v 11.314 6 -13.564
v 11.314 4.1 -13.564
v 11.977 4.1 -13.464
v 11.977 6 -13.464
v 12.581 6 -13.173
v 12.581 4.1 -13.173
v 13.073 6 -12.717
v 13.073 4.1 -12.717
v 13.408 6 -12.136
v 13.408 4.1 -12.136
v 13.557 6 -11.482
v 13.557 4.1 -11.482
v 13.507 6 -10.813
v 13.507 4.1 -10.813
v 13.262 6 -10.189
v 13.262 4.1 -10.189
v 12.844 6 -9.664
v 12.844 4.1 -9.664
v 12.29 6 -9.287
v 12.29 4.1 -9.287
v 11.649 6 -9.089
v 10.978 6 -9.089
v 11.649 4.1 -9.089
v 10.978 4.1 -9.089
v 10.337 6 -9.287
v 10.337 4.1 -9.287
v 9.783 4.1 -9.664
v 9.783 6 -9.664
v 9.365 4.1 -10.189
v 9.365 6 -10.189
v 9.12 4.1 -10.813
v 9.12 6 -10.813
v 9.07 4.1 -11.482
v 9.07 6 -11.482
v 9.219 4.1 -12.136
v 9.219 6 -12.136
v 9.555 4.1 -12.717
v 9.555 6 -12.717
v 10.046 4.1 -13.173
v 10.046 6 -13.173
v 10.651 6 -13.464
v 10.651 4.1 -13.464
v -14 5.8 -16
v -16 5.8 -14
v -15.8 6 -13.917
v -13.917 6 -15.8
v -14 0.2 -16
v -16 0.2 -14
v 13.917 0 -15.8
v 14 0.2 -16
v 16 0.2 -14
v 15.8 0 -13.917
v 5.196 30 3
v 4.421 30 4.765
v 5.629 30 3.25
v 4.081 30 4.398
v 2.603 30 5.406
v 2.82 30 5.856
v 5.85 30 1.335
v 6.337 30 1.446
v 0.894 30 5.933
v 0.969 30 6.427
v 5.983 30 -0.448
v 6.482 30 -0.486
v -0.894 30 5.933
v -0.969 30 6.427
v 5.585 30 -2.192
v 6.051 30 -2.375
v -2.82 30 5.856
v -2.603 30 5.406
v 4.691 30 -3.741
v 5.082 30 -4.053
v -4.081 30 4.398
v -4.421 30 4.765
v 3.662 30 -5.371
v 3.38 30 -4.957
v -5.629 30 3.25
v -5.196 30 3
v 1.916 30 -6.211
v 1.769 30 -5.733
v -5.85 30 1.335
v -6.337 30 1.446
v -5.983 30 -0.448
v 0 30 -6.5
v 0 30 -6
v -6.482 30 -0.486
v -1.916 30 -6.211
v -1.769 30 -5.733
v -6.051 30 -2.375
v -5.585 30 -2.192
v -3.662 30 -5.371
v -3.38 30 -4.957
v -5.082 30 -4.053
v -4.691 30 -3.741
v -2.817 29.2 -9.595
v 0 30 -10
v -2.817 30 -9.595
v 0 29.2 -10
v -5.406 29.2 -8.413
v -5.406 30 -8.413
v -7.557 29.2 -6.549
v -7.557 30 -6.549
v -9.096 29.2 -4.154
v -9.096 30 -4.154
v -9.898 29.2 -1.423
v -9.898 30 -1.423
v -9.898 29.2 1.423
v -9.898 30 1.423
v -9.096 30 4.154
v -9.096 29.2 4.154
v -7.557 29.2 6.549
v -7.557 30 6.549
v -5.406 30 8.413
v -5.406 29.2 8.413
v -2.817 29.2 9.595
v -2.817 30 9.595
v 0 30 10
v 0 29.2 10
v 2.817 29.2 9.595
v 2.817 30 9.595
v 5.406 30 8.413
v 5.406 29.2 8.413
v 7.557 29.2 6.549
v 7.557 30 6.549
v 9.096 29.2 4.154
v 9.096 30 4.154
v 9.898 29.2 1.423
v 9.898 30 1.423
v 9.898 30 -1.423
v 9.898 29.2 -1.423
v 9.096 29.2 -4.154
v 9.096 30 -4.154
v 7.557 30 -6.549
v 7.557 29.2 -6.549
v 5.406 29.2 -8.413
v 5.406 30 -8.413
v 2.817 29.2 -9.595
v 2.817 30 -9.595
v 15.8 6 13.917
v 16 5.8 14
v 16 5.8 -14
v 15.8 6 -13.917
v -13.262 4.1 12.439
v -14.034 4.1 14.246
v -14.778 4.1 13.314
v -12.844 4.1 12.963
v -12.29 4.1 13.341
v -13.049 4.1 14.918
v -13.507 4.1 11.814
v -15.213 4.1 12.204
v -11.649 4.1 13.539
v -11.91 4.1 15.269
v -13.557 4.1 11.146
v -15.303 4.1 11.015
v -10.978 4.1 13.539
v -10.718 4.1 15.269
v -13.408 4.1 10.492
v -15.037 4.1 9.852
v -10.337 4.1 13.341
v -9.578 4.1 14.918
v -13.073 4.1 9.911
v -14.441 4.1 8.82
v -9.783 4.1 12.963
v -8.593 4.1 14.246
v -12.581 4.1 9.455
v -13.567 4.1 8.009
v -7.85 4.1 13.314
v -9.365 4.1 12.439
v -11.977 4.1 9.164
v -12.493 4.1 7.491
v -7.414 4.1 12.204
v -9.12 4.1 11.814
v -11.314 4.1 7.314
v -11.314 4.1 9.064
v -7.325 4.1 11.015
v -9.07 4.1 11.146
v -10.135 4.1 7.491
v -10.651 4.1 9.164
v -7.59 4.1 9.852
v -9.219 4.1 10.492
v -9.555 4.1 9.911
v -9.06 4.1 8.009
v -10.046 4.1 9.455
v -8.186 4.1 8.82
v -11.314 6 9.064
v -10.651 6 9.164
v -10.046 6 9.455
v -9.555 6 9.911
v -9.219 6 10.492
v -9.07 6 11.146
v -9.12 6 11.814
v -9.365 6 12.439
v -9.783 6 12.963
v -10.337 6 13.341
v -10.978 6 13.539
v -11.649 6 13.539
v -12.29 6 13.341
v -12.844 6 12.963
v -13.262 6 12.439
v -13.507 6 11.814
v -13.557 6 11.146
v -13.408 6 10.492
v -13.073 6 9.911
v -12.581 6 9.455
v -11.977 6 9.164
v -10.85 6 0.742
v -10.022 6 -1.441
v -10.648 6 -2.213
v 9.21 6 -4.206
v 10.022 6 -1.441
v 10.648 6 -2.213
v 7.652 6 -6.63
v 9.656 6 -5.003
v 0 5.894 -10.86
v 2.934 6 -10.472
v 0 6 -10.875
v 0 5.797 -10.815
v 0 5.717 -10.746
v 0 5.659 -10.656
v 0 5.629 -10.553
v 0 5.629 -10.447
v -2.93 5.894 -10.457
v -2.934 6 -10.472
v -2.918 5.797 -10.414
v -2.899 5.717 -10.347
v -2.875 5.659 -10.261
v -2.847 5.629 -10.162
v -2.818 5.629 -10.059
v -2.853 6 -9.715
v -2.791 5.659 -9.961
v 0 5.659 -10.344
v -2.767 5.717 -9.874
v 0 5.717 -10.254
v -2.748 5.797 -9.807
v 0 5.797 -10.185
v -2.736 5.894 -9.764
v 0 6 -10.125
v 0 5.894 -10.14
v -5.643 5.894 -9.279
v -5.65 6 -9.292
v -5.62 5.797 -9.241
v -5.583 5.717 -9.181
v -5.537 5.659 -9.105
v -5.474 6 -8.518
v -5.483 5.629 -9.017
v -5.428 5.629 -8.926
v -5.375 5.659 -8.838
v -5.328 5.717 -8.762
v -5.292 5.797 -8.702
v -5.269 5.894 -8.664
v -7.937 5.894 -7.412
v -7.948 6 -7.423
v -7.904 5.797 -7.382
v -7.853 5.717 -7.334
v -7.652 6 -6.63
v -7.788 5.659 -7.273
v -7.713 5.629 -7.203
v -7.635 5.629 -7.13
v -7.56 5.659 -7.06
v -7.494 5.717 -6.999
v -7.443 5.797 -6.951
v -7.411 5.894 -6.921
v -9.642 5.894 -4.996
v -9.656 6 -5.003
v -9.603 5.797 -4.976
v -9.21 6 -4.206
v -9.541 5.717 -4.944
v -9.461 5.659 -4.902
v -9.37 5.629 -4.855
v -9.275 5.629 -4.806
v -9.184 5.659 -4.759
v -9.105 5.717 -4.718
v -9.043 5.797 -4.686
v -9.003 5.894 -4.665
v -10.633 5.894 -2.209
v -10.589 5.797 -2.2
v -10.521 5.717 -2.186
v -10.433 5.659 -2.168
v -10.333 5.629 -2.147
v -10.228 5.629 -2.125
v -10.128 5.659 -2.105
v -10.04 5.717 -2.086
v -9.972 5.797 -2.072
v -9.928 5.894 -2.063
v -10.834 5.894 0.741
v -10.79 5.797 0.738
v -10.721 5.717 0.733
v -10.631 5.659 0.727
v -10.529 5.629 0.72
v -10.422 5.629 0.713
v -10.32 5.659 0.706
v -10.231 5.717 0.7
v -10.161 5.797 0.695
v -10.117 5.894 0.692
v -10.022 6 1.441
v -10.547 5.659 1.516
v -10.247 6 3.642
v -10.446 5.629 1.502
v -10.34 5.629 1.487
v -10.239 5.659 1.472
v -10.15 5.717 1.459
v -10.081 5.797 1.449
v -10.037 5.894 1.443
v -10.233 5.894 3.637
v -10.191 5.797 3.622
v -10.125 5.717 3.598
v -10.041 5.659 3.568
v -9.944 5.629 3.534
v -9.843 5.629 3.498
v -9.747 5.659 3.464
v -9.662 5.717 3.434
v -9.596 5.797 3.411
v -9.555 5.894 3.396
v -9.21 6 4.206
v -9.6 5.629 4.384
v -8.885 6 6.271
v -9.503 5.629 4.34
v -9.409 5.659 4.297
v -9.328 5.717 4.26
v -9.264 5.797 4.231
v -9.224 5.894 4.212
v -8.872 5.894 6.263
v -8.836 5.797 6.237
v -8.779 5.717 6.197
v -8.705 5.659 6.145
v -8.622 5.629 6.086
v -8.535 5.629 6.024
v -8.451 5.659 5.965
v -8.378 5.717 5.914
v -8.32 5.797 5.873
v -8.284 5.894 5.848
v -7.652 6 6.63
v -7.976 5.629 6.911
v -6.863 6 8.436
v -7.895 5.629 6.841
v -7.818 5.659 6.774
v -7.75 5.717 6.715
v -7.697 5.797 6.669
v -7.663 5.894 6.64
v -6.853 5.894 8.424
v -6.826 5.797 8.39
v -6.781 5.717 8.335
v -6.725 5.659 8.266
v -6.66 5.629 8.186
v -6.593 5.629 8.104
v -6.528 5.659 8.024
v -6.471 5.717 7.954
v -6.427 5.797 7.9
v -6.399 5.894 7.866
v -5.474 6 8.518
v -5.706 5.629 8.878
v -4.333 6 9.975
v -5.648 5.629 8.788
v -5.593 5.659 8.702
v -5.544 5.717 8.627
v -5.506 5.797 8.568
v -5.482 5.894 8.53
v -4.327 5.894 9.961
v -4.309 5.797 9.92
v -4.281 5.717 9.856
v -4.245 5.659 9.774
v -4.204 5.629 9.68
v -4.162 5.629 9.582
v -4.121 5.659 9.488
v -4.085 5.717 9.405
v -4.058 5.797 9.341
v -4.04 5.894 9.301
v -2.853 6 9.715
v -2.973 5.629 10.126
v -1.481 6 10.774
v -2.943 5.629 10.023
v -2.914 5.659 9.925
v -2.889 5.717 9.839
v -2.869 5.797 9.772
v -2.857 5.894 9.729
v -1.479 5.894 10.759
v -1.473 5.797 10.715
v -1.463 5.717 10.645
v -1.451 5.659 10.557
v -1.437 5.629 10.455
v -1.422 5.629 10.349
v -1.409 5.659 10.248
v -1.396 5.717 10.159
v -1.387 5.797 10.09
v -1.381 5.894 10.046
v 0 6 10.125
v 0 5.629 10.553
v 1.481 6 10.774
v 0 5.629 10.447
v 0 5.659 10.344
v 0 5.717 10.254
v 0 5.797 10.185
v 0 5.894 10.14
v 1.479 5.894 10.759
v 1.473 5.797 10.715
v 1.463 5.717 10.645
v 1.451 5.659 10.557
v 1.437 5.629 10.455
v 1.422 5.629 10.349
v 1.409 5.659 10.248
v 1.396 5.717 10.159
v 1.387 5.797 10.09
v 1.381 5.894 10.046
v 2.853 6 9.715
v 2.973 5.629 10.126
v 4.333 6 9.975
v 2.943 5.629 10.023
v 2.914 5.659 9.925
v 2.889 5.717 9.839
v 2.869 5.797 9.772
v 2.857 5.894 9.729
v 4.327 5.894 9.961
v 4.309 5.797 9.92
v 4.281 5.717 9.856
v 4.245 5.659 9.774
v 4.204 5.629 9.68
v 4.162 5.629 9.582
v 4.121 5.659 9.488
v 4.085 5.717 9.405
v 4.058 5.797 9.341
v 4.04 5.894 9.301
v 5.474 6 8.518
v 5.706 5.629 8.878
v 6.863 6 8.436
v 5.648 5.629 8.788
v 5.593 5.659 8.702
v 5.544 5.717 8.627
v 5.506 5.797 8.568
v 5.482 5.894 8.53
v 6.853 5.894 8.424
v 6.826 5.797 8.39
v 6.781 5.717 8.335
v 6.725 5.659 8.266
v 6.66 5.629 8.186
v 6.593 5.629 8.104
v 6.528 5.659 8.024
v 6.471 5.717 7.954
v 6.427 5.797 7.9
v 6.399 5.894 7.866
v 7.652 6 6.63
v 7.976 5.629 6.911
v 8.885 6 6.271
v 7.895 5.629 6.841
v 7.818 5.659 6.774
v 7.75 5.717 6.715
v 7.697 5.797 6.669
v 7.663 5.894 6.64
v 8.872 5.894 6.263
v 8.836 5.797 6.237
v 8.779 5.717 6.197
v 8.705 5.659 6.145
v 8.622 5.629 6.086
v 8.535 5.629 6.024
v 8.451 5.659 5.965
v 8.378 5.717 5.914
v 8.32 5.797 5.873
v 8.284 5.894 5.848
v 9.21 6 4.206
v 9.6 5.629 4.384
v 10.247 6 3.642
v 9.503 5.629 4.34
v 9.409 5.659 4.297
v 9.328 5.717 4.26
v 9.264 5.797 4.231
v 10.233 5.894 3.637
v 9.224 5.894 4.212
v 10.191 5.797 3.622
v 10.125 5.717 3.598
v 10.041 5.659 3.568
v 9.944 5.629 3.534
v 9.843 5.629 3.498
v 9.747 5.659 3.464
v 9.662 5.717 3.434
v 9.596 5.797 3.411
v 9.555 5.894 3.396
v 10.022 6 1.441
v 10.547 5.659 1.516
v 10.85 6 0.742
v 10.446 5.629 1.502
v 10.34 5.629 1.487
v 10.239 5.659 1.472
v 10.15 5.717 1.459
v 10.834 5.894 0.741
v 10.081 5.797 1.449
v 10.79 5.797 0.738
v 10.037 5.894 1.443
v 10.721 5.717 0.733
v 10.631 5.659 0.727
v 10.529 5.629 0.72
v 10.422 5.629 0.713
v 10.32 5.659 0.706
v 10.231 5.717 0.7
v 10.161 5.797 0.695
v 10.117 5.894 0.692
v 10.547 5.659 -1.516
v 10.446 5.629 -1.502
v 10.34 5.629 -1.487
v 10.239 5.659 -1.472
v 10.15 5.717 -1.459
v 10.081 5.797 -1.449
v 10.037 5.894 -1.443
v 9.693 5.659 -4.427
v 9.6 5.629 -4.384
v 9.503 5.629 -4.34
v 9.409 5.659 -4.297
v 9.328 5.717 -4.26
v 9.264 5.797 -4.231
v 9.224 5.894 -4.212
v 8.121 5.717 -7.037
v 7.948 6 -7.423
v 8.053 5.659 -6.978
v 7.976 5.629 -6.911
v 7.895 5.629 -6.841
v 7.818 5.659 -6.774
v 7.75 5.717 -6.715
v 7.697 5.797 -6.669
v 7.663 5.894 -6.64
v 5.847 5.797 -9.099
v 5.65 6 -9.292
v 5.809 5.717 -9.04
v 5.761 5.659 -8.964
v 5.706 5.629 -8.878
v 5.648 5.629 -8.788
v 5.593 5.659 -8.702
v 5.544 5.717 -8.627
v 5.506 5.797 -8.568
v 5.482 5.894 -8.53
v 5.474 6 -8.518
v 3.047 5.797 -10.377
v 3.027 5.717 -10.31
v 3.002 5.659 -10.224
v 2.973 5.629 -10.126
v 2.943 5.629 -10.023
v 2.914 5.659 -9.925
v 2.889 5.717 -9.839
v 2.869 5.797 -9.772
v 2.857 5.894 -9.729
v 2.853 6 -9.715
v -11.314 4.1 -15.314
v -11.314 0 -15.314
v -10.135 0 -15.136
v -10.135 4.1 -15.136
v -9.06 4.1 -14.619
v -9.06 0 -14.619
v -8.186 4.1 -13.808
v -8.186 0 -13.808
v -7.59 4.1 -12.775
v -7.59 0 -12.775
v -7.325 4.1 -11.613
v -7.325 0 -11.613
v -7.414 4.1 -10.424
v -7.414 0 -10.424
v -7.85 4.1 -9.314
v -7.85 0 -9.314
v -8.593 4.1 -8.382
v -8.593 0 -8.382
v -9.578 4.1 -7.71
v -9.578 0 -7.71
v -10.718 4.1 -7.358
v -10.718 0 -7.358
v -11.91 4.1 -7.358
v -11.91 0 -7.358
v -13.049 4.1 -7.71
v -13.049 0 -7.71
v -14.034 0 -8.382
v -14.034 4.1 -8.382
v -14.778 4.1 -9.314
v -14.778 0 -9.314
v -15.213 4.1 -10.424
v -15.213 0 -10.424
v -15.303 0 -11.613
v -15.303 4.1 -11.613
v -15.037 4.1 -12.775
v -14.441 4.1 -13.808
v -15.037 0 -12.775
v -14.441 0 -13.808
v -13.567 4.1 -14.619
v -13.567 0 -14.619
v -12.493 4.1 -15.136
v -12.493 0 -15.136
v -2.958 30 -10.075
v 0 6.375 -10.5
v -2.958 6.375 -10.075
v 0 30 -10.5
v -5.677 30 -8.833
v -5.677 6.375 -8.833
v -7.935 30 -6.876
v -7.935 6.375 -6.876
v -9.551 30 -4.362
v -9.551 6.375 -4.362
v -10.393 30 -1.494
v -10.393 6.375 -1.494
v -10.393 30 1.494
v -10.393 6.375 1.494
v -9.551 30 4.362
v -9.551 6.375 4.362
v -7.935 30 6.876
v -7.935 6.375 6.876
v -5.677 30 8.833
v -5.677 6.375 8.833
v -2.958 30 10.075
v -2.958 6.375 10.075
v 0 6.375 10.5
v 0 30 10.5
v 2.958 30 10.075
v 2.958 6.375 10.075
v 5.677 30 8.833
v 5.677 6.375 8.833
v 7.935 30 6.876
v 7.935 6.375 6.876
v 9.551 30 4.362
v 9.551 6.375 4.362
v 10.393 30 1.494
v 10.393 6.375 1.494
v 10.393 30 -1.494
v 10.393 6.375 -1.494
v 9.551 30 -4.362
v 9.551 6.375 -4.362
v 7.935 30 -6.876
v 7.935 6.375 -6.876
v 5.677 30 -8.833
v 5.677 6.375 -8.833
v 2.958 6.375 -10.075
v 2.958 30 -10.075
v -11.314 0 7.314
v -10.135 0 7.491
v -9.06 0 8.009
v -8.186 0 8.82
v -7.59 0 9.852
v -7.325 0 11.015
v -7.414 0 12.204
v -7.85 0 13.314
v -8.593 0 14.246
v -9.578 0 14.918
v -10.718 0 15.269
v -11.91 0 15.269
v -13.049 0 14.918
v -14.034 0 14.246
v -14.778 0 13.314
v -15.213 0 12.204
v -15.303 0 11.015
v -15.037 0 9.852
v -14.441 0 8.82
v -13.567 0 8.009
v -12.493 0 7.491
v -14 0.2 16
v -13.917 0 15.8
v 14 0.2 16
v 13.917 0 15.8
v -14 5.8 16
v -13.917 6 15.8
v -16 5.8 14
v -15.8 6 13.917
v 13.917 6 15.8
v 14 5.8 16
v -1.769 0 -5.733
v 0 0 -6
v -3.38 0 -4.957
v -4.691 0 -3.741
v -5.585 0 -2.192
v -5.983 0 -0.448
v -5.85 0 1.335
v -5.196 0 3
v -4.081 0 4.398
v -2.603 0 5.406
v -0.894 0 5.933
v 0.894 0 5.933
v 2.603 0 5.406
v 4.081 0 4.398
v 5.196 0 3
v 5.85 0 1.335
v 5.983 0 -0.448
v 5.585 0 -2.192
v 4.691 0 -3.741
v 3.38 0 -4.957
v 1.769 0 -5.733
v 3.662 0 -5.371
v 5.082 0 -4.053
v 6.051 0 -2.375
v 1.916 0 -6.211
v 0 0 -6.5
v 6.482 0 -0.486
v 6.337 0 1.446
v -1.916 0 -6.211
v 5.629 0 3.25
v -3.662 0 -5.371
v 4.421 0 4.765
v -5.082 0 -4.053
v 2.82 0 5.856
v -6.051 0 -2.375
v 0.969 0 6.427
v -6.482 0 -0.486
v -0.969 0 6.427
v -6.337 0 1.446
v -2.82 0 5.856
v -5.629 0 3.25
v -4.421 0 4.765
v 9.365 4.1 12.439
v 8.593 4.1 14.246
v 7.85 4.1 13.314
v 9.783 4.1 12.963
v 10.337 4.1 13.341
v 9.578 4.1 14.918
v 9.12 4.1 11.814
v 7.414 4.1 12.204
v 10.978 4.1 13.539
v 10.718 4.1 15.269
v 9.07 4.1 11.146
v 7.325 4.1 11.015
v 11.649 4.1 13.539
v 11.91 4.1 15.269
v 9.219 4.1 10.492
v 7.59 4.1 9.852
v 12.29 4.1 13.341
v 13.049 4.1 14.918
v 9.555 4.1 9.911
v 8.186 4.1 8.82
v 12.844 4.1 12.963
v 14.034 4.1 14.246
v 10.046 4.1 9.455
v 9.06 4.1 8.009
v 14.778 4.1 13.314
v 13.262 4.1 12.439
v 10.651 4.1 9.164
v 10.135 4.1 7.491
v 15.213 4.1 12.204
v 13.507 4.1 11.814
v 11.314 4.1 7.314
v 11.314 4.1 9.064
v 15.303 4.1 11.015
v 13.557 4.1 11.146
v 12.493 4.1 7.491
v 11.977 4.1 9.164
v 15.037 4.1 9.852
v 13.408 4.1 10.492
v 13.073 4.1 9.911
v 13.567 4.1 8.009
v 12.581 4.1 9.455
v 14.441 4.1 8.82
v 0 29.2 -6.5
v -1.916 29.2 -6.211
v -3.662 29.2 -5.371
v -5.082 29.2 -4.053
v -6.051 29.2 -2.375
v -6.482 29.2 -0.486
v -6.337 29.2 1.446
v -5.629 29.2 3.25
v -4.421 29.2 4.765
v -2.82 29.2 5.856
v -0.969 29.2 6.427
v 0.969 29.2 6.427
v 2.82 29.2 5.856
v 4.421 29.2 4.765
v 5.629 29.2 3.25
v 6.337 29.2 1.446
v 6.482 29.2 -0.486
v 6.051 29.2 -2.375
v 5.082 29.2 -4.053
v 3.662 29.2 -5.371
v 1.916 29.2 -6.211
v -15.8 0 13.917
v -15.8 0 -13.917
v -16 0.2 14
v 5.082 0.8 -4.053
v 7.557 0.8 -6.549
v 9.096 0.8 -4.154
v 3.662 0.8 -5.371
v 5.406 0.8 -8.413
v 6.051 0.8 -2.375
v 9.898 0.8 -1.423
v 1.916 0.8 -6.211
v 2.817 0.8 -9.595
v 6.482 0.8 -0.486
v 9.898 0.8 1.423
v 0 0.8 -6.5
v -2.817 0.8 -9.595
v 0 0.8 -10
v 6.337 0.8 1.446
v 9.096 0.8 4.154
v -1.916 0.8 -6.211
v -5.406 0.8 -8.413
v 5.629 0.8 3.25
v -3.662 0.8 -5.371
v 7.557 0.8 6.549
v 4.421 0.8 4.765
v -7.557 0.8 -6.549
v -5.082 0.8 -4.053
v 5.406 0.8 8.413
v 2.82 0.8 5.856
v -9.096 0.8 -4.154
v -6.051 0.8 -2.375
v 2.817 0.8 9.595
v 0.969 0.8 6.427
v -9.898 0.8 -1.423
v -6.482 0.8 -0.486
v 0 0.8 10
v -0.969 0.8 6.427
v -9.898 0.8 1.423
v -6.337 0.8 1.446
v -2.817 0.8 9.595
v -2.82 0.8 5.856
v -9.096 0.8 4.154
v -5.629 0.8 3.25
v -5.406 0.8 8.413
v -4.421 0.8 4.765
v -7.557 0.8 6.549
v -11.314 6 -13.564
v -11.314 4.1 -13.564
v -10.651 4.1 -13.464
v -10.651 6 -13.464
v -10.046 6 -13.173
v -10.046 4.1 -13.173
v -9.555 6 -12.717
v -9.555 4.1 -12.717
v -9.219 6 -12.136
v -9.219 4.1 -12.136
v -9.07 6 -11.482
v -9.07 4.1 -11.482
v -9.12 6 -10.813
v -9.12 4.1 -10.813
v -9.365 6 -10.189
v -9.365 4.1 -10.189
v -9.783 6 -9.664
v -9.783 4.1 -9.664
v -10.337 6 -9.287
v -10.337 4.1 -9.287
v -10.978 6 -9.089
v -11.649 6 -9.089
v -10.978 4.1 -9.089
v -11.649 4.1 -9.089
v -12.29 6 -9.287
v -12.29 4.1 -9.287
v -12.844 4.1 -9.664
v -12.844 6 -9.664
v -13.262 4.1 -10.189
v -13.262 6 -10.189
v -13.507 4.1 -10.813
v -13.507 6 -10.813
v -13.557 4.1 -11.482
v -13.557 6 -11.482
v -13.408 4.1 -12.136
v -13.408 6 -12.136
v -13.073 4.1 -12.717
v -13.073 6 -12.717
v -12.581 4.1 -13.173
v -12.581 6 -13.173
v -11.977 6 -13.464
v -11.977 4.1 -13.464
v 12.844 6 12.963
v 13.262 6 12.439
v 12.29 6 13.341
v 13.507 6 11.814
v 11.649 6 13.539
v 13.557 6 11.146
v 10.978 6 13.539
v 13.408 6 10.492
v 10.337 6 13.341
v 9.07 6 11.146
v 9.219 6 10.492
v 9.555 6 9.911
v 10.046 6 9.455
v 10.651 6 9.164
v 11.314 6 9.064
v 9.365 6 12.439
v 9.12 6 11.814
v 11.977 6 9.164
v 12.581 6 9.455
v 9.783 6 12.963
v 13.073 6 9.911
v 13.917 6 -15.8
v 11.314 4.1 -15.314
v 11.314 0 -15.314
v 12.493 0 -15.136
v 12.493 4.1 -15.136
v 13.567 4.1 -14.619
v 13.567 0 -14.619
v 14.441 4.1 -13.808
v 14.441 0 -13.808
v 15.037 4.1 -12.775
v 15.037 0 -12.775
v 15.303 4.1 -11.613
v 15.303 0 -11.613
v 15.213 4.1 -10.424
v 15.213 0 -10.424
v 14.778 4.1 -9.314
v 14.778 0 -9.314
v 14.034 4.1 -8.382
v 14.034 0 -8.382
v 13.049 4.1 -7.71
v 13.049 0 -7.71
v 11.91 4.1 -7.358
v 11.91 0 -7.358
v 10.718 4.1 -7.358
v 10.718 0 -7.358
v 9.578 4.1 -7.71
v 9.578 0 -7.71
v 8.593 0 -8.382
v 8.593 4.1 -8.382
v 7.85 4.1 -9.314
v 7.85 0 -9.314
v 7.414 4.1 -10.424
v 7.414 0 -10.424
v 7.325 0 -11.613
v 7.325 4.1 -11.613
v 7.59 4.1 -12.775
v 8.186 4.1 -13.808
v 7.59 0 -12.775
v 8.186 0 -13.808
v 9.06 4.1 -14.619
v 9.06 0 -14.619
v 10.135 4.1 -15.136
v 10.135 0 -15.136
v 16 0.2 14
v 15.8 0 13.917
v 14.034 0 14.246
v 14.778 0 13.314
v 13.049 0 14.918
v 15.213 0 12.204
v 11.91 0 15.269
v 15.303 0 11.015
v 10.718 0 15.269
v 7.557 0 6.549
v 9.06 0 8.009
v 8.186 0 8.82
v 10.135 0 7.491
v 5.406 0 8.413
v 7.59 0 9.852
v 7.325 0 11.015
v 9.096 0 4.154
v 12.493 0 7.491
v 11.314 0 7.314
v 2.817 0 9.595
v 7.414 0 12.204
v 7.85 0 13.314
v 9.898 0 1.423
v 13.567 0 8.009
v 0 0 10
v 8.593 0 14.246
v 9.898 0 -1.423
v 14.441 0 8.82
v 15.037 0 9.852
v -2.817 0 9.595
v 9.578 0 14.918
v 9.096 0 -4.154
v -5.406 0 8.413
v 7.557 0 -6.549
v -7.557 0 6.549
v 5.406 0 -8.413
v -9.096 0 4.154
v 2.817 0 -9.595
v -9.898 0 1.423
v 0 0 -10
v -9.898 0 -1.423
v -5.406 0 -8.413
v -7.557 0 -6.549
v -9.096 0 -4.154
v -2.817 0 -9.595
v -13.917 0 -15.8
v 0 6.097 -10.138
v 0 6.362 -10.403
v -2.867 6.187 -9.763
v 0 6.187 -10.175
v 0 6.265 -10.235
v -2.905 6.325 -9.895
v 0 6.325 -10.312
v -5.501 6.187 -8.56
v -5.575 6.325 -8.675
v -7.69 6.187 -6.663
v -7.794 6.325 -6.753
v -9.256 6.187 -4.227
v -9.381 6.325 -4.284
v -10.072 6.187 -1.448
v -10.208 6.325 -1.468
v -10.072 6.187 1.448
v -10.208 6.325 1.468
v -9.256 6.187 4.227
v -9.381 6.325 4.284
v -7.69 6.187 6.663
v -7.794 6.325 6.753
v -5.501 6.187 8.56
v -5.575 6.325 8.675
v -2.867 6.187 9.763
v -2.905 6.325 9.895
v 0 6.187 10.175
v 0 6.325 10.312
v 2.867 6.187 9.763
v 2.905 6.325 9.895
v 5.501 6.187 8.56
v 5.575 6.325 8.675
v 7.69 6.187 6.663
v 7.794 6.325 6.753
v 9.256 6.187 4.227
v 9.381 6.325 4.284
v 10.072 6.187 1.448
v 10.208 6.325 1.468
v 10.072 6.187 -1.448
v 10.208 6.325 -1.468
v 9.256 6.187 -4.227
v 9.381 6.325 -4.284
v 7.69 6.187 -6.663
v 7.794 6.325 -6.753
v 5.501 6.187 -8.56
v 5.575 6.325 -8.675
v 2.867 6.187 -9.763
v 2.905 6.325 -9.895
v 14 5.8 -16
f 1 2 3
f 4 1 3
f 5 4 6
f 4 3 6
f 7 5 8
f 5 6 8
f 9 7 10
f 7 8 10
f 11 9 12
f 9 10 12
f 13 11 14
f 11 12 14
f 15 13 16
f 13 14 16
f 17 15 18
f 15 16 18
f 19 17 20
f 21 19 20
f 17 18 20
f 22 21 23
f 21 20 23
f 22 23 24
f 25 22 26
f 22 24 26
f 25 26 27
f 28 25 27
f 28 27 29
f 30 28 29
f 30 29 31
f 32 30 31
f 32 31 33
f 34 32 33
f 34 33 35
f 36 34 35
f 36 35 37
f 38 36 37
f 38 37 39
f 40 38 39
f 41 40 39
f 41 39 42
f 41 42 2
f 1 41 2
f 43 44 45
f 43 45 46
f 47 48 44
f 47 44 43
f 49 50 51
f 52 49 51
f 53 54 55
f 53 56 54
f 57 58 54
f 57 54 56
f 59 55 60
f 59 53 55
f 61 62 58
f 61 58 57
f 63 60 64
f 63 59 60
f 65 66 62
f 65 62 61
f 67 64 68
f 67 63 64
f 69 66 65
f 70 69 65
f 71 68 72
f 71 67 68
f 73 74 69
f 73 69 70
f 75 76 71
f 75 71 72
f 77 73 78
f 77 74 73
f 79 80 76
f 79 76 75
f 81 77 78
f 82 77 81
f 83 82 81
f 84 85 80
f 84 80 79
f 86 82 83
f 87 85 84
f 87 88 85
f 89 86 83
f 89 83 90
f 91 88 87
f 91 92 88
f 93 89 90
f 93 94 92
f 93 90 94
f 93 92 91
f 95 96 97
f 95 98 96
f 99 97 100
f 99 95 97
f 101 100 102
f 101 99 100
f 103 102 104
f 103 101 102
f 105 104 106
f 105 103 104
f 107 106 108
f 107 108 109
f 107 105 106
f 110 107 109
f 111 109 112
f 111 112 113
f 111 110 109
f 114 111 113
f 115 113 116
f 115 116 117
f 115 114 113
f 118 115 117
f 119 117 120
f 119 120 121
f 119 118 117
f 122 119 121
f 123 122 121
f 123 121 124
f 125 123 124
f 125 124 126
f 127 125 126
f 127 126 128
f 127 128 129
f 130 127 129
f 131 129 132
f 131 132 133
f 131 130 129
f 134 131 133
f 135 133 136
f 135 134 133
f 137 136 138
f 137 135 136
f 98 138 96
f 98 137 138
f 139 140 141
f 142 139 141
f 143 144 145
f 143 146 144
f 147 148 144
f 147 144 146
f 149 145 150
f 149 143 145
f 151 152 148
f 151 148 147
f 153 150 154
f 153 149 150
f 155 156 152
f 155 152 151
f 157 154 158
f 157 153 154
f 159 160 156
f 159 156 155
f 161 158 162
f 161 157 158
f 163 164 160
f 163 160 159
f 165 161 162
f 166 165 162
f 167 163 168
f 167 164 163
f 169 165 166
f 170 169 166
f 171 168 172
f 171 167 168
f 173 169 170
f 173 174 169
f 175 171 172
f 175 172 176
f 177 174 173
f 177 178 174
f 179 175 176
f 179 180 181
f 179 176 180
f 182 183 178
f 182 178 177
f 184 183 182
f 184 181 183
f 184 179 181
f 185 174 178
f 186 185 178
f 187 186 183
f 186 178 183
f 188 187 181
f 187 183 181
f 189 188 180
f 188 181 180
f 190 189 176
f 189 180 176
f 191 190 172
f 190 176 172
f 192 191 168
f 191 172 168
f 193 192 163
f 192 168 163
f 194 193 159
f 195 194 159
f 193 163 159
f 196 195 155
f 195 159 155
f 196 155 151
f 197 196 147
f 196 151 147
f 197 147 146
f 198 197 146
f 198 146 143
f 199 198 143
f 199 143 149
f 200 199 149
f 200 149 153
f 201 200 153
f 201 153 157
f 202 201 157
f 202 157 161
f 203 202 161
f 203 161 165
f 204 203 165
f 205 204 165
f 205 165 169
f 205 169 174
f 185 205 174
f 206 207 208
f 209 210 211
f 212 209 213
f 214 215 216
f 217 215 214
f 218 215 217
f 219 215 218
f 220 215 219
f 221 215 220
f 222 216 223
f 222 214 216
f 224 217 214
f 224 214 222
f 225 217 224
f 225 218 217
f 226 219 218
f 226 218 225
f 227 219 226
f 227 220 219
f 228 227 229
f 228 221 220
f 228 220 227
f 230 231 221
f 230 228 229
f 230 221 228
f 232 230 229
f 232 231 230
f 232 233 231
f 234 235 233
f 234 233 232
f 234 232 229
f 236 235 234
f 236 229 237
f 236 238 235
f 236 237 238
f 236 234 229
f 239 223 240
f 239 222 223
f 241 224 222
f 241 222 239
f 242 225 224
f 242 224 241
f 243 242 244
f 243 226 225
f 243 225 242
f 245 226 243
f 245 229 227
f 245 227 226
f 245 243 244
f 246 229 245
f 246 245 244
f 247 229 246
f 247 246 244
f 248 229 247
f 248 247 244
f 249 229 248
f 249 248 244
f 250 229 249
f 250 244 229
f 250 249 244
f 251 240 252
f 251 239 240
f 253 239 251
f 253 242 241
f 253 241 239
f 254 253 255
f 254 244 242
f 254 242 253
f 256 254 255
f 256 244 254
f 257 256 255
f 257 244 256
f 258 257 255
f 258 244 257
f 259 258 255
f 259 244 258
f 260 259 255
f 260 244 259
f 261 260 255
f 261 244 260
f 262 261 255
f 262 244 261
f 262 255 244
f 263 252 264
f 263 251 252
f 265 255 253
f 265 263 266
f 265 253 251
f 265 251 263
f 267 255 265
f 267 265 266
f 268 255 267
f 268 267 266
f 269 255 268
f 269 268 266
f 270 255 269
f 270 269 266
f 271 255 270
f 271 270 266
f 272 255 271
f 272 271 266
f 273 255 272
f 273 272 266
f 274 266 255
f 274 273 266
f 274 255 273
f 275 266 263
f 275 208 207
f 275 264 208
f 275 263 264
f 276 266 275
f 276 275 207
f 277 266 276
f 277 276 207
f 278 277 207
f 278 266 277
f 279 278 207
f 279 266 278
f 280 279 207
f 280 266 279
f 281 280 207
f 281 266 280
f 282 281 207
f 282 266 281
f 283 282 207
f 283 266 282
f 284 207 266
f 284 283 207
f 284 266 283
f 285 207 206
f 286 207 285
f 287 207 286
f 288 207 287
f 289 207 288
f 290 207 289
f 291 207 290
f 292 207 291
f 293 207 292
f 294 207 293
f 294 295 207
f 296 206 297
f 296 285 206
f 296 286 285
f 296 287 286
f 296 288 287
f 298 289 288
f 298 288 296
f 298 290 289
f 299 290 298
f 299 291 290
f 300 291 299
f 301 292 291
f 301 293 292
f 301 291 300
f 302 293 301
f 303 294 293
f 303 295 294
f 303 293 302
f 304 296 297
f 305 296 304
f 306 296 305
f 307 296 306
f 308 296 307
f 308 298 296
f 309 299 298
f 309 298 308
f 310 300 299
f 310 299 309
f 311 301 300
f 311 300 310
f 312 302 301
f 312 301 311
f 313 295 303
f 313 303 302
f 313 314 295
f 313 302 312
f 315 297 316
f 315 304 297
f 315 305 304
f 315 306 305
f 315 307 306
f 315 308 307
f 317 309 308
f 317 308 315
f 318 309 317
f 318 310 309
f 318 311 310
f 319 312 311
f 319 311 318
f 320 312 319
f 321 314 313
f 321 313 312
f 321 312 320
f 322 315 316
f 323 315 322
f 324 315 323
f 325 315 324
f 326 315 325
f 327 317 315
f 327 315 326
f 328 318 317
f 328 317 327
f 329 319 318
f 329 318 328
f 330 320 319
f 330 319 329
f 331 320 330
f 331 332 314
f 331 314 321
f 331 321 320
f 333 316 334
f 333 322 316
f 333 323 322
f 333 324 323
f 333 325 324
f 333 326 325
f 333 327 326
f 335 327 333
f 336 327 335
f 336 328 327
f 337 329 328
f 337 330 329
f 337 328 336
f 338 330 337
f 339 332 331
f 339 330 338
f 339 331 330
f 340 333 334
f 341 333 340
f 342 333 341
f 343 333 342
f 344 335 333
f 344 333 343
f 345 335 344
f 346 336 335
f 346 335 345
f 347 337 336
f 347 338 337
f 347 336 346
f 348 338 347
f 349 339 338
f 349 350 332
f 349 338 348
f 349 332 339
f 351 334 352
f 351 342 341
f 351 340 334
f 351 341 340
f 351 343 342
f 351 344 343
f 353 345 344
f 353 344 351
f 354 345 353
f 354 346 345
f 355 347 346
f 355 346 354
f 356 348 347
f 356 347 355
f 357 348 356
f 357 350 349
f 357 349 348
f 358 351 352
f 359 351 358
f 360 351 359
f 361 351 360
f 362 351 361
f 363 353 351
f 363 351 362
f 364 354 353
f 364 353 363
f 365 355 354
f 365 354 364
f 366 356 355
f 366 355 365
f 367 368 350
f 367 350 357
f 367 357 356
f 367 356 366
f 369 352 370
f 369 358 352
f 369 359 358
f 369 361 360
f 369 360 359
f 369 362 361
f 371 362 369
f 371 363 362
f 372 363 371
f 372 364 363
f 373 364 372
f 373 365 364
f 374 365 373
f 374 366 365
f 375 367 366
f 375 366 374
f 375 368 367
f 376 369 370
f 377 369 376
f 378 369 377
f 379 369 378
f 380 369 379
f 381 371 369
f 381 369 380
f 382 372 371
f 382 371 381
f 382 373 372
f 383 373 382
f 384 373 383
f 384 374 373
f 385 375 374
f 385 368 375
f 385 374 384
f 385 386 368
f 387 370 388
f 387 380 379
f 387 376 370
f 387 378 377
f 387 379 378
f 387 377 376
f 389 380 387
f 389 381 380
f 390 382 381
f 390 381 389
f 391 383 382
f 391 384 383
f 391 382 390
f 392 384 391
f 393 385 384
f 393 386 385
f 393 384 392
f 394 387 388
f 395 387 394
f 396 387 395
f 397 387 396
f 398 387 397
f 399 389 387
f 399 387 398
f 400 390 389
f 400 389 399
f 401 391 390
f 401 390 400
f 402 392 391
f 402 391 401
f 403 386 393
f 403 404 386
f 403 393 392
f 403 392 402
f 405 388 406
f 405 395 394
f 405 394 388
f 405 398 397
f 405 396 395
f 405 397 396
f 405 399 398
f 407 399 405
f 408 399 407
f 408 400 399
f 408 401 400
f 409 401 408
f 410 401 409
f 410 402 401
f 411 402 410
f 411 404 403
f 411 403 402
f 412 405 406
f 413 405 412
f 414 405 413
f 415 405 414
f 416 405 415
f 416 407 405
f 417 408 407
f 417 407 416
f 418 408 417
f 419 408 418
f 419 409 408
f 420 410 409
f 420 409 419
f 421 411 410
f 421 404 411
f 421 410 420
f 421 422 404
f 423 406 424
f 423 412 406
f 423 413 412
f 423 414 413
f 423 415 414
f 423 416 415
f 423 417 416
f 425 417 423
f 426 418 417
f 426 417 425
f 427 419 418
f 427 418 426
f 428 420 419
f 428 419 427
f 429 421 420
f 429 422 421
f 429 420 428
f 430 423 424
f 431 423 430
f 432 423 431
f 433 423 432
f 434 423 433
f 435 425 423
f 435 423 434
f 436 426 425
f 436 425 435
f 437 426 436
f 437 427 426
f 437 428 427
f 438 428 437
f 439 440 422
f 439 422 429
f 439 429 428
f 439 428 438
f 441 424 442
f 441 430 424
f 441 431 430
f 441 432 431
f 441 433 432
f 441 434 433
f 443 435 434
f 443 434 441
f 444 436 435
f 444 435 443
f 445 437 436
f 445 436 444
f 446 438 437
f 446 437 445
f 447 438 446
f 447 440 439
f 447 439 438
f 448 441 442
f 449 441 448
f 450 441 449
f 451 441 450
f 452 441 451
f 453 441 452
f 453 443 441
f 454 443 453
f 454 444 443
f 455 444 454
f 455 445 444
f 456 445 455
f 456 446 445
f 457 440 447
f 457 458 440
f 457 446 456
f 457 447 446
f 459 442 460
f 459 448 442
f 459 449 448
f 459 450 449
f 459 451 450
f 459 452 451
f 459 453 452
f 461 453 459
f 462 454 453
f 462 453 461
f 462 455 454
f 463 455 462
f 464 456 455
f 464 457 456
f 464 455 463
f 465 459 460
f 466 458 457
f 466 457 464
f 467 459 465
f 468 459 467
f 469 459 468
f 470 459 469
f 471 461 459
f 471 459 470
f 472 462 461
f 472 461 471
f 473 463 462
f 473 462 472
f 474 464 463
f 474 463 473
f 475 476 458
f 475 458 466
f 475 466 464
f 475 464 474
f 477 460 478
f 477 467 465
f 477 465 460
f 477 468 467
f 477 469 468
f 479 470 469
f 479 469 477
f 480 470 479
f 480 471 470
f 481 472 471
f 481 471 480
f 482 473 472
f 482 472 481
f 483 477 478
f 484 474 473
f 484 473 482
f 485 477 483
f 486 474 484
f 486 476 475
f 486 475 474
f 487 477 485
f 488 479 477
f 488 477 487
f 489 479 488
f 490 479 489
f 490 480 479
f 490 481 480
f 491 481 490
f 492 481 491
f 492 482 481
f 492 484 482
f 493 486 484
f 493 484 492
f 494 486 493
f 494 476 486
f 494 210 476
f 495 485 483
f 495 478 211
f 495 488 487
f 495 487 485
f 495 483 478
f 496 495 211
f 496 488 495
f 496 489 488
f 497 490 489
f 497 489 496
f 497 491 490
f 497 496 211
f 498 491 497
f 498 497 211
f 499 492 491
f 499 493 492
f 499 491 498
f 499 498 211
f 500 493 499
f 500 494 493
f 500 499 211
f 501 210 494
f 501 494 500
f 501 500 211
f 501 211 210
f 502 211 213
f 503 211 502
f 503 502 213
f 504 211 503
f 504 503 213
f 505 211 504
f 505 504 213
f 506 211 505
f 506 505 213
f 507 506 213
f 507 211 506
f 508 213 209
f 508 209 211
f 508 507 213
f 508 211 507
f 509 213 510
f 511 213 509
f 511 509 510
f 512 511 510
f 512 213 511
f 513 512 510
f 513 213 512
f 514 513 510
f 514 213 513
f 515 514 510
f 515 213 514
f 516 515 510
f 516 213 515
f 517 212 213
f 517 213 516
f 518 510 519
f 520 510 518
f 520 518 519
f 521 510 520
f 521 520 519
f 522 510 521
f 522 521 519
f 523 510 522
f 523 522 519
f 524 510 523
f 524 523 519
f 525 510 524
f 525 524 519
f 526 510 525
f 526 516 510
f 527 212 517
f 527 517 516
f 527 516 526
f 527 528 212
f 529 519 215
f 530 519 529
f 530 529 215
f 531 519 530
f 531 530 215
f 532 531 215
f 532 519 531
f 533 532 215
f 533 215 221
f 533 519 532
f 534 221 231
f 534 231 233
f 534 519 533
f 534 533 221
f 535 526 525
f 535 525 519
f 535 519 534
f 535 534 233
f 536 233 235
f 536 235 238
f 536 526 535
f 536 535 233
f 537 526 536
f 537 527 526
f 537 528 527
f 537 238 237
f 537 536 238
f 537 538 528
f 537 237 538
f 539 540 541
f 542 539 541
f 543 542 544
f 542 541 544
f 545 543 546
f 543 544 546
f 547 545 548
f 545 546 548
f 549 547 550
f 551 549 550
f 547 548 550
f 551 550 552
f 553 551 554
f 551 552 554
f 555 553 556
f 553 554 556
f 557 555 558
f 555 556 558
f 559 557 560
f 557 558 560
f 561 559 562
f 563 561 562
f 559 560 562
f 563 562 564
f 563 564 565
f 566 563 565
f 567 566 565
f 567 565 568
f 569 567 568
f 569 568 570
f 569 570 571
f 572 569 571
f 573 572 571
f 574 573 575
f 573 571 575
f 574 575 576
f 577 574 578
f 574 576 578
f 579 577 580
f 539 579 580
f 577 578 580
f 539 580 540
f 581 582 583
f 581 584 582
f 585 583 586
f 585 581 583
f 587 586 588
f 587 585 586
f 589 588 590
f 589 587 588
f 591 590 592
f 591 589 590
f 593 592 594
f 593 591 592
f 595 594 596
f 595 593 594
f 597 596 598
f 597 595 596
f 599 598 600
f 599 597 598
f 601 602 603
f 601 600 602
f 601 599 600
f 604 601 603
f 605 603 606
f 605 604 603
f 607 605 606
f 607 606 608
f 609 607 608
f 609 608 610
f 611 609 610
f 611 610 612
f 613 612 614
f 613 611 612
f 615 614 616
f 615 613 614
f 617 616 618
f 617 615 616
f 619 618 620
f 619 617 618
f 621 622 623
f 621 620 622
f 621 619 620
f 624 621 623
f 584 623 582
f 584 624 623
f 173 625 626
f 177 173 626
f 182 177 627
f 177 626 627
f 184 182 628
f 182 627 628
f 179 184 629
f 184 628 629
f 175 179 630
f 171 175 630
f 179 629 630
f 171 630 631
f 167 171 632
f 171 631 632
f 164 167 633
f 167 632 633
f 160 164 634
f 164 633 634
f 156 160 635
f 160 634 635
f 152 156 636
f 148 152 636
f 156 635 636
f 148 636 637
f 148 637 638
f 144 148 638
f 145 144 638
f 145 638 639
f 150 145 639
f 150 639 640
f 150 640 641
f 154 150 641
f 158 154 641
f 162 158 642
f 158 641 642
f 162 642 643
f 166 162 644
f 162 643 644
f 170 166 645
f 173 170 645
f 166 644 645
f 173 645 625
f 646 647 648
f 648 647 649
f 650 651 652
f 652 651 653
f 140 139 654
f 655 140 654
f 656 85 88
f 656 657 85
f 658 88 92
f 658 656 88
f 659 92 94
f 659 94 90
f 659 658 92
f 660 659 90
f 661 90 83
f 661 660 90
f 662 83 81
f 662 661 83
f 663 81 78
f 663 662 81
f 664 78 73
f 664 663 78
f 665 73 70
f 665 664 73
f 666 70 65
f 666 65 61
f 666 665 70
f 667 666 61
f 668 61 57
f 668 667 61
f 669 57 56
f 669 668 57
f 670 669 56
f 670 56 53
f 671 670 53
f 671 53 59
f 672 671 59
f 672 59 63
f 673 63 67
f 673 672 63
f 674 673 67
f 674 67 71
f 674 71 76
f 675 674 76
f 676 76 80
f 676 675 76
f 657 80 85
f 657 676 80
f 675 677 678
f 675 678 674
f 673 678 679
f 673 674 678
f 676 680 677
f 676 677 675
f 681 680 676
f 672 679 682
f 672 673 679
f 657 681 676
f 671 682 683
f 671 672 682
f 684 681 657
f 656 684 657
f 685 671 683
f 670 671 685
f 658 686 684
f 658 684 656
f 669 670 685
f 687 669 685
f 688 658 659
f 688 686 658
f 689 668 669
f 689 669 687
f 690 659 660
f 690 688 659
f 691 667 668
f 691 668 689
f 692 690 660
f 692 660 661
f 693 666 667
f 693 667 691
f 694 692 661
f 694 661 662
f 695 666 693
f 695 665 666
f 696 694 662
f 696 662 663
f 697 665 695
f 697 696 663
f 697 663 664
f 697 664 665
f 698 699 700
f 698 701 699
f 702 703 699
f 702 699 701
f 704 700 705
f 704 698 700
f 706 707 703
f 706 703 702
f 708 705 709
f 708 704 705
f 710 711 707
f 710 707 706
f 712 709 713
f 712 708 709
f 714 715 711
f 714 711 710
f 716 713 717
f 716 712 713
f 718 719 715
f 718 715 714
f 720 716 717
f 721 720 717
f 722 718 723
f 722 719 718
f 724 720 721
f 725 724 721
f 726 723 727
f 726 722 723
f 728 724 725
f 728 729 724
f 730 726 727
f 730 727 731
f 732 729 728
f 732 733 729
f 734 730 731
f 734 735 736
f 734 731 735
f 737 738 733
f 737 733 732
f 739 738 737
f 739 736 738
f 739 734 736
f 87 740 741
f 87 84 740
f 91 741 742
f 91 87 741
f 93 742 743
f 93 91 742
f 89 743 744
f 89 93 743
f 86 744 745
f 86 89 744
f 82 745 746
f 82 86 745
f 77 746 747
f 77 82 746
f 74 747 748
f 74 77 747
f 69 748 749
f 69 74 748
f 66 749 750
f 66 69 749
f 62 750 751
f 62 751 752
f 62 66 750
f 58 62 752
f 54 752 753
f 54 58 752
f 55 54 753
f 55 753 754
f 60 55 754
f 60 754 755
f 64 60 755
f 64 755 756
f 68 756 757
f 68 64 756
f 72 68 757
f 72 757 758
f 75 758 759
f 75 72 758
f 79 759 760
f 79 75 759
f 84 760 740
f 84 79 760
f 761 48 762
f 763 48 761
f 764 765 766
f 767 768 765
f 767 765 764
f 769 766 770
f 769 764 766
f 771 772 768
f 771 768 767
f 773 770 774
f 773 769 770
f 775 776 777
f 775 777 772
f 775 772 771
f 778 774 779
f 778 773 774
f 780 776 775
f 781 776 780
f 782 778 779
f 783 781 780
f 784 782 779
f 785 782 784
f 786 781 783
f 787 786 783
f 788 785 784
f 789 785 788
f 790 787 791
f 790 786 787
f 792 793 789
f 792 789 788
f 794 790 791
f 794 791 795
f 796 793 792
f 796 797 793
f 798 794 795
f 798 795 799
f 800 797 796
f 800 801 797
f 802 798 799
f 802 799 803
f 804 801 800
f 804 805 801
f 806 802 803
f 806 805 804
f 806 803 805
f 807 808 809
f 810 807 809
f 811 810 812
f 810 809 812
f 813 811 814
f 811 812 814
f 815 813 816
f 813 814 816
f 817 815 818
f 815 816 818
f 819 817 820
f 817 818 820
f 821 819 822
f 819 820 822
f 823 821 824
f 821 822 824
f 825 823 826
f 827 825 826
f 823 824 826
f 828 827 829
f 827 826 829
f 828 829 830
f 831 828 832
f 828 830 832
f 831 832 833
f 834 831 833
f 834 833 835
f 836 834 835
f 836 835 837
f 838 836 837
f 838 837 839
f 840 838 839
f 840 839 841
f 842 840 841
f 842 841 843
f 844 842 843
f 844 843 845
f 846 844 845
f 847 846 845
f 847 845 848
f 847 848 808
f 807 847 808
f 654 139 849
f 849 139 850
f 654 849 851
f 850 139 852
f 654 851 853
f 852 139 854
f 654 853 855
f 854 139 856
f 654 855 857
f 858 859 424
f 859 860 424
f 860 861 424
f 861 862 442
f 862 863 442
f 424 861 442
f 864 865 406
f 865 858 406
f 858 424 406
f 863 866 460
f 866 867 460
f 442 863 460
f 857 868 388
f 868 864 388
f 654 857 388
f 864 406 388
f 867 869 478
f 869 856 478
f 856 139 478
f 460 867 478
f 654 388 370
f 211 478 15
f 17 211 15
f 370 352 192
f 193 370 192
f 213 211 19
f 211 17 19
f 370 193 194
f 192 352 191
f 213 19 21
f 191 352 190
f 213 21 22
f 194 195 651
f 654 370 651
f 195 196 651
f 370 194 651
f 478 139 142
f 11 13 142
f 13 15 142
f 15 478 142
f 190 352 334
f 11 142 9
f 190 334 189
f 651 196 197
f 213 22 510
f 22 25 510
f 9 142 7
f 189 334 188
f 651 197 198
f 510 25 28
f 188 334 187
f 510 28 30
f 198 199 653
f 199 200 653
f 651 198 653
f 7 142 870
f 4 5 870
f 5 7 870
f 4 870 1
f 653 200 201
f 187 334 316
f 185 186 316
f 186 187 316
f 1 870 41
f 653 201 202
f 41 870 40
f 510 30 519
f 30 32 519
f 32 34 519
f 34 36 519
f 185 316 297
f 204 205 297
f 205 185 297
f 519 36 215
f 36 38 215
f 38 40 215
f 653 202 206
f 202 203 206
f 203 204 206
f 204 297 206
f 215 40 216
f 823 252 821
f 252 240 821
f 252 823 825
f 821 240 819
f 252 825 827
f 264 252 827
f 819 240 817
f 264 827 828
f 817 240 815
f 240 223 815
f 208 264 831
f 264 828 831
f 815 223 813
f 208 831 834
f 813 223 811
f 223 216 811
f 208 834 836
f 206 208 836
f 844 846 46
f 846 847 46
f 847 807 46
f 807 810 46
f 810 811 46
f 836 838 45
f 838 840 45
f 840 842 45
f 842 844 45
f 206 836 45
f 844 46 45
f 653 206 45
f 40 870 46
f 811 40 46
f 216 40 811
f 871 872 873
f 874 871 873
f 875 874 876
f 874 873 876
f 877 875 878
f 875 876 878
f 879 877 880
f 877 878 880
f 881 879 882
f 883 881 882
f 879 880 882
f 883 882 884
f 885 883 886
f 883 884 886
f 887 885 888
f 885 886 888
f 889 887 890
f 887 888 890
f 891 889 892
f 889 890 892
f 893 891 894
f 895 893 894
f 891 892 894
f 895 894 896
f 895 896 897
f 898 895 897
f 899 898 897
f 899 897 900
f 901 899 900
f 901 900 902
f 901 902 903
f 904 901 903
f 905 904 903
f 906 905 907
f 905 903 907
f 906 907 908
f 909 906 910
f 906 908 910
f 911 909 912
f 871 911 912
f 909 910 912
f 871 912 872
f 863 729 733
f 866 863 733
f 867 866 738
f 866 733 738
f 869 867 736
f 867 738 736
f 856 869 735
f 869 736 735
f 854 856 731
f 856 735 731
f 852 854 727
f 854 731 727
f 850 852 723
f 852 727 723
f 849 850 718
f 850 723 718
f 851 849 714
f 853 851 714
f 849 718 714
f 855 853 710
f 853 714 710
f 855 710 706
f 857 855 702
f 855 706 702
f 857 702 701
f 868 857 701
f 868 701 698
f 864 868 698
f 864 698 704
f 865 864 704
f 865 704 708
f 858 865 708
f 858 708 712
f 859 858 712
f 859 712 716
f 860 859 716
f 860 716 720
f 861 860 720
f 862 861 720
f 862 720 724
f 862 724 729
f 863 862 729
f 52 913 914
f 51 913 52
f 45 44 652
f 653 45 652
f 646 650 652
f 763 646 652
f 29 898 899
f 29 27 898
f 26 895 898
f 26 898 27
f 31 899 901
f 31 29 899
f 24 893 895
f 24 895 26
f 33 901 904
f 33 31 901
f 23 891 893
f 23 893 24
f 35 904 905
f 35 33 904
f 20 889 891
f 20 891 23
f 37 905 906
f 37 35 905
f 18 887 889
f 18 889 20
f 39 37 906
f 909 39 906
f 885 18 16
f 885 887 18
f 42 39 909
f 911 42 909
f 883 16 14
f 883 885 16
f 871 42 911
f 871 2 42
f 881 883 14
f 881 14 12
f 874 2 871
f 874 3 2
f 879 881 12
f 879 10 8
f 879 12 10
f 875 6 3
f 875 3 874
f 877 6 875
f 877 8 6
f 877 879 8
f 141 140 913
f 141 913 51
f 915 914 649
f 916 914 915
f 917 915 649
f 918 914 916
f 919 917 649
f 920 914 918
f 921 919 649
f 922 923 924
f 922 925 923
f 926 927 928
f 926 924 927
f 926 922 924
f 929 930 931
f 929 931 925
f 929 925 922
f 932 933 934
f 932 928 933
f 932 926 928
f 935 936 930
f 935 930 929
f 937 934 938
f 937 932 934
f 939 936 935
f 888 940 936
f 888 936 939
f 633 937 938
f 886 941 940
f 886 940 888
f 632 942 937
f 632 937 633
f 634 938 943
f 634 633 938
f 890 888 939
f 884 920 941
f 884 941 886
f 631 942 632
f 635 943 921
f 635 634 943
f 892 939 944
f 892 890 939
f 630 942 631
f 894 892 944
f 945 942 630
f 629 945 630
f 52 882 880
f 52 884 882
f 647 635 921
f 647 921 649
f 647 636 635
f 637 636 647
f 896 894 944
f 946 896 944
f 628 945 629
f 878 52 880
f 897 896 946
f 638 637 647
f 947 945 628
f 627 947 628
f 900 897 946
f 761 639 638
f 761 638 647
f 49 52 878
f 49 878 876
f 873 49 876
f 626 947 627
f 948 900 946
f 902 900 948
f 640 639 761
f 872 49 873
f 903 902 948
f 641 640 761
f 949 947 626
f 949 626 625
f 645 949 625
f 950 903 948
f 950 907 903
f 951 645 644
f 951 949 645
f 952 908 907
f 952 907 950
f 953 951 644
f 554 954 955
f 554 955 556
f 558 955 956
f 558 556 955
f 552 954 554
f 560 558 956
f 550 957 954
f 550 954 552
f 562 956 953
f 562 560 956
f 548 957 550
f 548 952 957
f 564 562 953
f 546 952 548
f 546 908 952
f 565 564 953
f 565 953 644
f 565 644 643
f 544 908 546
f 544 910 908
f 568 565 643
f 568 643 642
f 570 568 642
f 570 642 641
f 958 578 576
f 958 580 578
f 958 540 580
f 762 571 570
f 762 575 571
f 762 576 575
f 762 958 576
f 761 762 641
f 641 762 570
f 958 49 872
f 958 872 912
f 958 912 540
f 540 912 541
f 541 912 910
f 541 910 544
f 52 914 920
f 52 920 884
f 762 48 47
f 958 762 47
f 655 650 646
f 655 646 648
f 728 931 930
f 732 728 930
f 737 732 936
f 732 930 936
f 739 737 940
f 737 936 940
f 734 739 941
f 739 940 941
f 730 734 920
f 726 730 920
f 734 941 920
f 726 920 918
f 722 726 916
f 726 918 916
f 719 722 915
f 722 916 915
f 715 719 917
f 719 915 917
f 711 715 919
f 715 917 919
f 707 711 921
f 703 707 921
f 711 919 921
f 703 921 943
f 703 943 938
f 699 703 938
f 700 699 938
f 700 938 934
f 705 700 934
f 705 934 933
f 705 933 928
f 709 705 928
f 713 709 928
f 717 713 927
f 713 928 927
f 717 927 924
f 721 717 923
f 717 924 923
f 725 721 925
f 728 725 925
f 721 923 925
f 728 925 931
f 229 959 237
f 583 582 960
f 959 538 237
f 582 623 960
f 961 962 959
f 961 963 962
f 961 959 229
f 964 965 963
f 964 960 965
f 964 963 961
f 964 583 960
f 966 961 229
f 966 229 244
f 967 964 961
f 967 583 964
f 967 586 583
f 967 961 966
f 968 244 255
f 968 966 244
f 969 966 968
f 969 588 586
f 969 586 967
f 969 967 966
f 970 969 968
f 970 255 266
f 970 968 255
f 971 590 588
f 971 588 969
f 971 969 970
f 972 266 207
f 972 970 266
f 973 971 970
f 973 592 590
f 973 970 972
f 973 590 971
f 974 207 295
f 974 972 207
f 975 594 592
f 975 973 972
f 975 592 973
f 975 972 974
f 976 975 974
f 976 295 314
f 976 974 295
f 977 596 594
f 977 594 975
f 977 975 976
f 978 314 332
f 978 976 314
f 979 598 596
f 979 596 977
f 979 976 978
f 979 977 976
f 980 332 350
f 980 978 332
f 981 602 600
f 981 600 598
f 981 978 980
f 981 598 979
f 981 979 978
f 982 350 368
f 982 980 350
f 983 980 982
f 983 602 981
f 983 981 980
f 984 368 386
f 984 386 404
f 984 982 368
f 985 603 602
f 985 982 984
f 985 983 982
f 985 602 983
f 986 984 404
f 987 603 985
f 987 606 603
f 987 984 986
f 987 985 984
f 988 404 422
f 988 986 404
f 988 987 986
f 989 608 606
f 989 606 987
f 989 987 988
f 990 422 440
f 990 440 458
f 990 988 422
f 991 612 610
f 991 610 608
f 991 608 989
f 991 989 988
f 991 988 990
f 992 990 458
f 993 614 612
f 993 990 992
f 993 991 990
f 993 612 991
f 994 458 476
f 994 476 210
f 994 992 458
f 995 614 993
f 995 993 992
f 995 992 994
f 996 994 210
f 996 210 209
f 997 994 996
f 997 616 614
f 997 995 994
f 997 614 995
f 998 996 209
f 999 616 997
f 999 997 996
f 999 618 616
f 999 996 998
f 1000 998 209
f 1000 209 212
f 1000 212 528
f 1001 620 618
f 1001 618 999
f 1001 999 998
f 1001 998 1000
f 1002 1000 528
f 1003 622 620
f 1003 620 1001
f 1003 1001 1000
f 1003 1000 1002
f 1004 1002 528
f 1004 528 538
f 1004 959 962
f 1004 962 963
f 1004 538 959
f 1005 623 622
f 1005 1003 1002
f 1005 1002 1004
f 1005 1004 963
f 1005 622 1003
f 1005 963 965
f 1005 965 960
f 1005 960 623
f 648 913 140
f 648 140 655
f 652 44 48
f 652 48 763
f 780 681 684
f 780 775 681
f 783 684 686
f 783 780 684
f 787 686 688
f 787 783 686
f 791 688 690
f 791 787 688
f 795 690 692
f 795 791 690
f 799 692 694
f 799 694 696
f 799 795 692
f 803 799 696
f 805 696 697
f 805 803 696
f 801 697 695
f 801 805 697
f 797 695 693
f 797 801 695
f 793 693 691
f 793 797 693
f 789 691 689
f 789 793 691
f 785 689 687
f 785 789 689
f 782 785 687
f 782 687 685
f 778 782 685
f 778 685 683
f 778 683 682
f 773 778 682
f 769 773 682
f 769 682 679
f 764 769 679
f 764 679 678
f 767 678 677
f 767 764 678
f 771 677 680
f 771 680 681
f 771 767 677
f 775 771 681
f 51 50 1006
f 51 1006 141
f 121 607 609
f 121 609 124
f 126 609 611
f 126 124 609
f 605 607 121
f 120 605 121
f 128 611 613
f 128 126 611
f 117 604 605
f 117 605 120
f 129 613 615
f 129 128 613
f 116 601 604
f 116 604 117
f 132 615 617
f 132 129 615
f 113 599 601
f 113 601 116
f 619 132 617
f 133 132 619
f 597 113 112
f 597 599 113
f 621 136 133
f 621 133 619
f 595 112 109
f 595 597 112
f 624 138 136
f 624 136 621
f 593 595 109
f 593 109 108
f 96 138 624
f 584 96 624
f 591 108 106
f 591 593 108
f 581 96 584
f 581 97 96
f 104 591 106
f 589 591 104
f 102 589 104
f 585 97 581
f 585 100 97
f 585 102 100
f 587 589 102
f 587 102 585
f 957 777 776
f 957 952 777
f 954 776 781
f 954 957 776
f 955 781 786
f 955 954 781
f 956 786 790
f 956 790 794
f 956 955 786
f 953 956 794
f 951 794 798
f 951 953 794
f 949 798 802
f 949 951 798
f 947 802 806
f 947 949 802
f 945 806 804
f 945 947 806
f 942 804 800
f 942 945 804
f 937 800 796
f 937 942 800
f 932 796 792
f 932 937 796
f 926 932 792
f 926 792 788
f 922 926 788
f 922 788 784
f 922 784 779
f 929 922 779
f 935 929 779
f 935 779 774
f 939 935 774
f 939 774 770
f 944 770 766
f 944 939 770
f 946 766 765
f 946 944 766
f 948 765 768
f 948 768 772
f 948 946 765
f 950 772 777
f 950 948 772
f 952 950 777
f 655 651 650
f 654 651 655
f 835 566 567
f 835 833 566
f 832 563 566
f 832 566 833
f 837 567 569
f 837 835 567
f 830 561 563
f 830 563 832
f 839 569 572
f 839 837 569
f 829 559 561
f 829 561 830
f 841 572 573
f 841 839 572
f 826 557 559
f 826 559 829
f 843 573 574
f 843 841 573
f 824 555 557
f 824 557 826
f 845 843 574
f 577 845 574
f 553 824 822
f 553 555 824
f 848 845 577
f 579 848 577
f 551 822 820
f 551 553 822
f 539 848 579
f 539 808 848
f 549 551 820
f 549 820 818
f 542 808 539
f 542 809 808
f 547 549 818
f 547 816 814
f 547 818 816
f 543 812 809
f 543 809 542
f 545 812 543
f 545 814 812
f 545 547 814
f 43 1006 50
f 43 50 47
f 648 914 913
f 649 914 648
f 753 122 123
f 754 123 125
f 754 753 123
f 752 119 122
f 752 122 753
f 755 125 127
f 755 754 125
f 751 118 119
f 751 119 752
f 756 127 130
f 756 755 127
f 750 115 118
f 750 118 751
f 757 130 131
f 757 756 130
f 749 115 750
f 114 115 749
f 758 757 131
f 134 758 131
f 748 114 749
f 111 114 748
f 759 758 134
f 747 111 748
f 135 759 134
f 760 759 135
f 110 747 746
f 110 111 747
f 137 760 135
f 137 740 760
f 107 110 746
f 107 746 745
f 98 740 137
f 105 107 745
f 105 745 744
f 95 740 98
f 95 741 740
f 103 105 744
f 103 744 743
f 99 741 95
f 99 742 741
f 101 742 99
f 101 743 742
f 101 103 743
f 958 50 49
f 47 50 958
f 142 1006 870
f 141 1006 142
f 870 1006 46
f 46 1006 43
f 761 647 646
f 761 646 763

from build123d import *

# Parameters (mm, degrees)
FLANGE_START         = 6
FLANGE_DEPTH         = 6
SKETCH9_R            = 4
COUNTERBORE_DEPTH    = 4.1
SKETCH10_R           = 2.25
MOUNTING_HOLES_DEPTH = 35.392004885
SKETCH11_R           = 0.375
CHAMFER1_SIZE        = 0.2


with BuildPart() as part:
    # Sketch5 → Bearing Body (revolve)
    with BuildSketch(Plane(origin=(0, 0, 0), x_dir=(0, 0, -1), z_dir=(1, 0, 0))):
        Polygon((6.5, 30), (6, 30), (6, 0), (6.5, 0), (6.5, 0.8), (10, 0.8), (10, 0), (10.5, 0), (10.5, 30), (10, 30), (10, 29.2), (6.5, 29.2), align=None)
    revolve(axis=Axis((0, 0, 0), (0, 1, 0)))

    # Sketch8 → Flange (add)
    with BuildSketch(Plane(origin=(0, 0, 0), x_dir=(1, 0, 0), z_dir=(0, 1, 0)).offset(FLANGE_START)):
        Polygon((0, -16), (-14, -16), (-16, -14), (-16, 0), (-16, 14), (-14, 16), (0, 16), (14, 16), (16, 14), (16, 0), (16, -14), (14, -16), align=None)
        with BuildLine():
            ThreePointArc((-10.5, 0), (-7.424621202, -7.424621202), (0, -10.5))
            ThreePointArc((0, -10.5), (7.424621202, -7.424621202), (10.5, 0))
            ThreePointArc((10.5, 0), (7.424621202, 7.424621202), (0, 10.5))
            ThreePointArc((0, 10.5), (-7.424621202, 7.424621202), (-10.5, 0))
        make_face(mode=Mode.SUBTRACT)
    extrude(amount=-FLANGE_DEPTH)

    # Sketch9 → Counterbore (cut)
    with BuildSketch(Plane(origin=(0, 0, 0), x_dir=(-1, 0, 0), z_dir=(0, -1, 0))):
        with Locations(Location((11.313708499, -11.313708499, 0), (0, 0, 90))):
            Circle(SKETCH9_R)
        with Locations(Location((-11.313708499, -11.313708499, 0), (0, 0, 90))):
            Circle(SKETCH9_R)
        with Locations(Location((-11.313708499, 11.313708499, 0), (0, 0, 90))):
            Circle(SKETCH9_R)
        with Locations(Location((11.313708499, 11.313708499, 0), (0, 0, 90))):
            Circle(SKETCH9_R)
    extrude(amount=-COUNTERBORE_DEPTH, mode=Mode.SUBTRACT)

    # Sketch10 → Mounting Holes (cut, through all)
    with BuildSketch(Plane(origin=(0, 4.1, 0), x_dir=(-1, 0, 0), z_dir=(0, -1, 0))):
        with Locations(Location((11.313708499, 11.313708499, 0), (0, 0, 90))):
            Circle(SKETCH10_R)
        with Locations(Location((11.313708499, -11.313708499, 0), (0, 0, 90))):
            Circle(SKETCH10_R)
        with Locations(Location((-11.313708499, -11.313708499, 0), (0, 0, 90))):
            Circle(SKETCH10_R)
        with Locations(Location((-11.313708499, 11.313708499, 0), (0, 0, 90))):
            Circle(SKETCH10_R)
    extrude(amount=-MOUNTING_HOLES_DEPTH, mode=Mode.SUBTRACT)

    # Sketch11 → Relief (revolve, cut)
    with BuildSketch(Plane(origin=(0, 0, 0), x_dir=(0, 0, -1), z_dir=(1, 0, 0)), mode=Mode.PRIVATE) as relief_sk:
        with Locations((-10.5, 6)):
            Circle(SKETCH11_R)
    revolve(relief_sk.sketch.rotate(Axis((0, 0, 0), (0, 1, 0)), 180), axis=Axis((0, 0, 0), (0, 1, 0)), mode=Mode.SUBTRACT)

    # Chamfer1
    chamfer1_edges = [part.edges().sort_by_distance(p)[0] for p in [
        (-15, 6, 15),
        (0, 6, 16),
        (15, 6, 15),
        (16, 6, 0),
        (15, 6, -15),
        (0, 6, -16),
        (-15, 6, -15),
        (-16, 6, 0),
        (-15, 0, 15),
        (0, 0, 16),
        (15, 0, 15),
        (16, 0, 0),
        (15, 0, -15),
        (0, 0, -16),
        (-15, 0, -15),
        (-16, 0, 0),
    ]]
    chamfer(chamfer1_edges, length=CHAMFER1_SIZE)


solid = part.part
